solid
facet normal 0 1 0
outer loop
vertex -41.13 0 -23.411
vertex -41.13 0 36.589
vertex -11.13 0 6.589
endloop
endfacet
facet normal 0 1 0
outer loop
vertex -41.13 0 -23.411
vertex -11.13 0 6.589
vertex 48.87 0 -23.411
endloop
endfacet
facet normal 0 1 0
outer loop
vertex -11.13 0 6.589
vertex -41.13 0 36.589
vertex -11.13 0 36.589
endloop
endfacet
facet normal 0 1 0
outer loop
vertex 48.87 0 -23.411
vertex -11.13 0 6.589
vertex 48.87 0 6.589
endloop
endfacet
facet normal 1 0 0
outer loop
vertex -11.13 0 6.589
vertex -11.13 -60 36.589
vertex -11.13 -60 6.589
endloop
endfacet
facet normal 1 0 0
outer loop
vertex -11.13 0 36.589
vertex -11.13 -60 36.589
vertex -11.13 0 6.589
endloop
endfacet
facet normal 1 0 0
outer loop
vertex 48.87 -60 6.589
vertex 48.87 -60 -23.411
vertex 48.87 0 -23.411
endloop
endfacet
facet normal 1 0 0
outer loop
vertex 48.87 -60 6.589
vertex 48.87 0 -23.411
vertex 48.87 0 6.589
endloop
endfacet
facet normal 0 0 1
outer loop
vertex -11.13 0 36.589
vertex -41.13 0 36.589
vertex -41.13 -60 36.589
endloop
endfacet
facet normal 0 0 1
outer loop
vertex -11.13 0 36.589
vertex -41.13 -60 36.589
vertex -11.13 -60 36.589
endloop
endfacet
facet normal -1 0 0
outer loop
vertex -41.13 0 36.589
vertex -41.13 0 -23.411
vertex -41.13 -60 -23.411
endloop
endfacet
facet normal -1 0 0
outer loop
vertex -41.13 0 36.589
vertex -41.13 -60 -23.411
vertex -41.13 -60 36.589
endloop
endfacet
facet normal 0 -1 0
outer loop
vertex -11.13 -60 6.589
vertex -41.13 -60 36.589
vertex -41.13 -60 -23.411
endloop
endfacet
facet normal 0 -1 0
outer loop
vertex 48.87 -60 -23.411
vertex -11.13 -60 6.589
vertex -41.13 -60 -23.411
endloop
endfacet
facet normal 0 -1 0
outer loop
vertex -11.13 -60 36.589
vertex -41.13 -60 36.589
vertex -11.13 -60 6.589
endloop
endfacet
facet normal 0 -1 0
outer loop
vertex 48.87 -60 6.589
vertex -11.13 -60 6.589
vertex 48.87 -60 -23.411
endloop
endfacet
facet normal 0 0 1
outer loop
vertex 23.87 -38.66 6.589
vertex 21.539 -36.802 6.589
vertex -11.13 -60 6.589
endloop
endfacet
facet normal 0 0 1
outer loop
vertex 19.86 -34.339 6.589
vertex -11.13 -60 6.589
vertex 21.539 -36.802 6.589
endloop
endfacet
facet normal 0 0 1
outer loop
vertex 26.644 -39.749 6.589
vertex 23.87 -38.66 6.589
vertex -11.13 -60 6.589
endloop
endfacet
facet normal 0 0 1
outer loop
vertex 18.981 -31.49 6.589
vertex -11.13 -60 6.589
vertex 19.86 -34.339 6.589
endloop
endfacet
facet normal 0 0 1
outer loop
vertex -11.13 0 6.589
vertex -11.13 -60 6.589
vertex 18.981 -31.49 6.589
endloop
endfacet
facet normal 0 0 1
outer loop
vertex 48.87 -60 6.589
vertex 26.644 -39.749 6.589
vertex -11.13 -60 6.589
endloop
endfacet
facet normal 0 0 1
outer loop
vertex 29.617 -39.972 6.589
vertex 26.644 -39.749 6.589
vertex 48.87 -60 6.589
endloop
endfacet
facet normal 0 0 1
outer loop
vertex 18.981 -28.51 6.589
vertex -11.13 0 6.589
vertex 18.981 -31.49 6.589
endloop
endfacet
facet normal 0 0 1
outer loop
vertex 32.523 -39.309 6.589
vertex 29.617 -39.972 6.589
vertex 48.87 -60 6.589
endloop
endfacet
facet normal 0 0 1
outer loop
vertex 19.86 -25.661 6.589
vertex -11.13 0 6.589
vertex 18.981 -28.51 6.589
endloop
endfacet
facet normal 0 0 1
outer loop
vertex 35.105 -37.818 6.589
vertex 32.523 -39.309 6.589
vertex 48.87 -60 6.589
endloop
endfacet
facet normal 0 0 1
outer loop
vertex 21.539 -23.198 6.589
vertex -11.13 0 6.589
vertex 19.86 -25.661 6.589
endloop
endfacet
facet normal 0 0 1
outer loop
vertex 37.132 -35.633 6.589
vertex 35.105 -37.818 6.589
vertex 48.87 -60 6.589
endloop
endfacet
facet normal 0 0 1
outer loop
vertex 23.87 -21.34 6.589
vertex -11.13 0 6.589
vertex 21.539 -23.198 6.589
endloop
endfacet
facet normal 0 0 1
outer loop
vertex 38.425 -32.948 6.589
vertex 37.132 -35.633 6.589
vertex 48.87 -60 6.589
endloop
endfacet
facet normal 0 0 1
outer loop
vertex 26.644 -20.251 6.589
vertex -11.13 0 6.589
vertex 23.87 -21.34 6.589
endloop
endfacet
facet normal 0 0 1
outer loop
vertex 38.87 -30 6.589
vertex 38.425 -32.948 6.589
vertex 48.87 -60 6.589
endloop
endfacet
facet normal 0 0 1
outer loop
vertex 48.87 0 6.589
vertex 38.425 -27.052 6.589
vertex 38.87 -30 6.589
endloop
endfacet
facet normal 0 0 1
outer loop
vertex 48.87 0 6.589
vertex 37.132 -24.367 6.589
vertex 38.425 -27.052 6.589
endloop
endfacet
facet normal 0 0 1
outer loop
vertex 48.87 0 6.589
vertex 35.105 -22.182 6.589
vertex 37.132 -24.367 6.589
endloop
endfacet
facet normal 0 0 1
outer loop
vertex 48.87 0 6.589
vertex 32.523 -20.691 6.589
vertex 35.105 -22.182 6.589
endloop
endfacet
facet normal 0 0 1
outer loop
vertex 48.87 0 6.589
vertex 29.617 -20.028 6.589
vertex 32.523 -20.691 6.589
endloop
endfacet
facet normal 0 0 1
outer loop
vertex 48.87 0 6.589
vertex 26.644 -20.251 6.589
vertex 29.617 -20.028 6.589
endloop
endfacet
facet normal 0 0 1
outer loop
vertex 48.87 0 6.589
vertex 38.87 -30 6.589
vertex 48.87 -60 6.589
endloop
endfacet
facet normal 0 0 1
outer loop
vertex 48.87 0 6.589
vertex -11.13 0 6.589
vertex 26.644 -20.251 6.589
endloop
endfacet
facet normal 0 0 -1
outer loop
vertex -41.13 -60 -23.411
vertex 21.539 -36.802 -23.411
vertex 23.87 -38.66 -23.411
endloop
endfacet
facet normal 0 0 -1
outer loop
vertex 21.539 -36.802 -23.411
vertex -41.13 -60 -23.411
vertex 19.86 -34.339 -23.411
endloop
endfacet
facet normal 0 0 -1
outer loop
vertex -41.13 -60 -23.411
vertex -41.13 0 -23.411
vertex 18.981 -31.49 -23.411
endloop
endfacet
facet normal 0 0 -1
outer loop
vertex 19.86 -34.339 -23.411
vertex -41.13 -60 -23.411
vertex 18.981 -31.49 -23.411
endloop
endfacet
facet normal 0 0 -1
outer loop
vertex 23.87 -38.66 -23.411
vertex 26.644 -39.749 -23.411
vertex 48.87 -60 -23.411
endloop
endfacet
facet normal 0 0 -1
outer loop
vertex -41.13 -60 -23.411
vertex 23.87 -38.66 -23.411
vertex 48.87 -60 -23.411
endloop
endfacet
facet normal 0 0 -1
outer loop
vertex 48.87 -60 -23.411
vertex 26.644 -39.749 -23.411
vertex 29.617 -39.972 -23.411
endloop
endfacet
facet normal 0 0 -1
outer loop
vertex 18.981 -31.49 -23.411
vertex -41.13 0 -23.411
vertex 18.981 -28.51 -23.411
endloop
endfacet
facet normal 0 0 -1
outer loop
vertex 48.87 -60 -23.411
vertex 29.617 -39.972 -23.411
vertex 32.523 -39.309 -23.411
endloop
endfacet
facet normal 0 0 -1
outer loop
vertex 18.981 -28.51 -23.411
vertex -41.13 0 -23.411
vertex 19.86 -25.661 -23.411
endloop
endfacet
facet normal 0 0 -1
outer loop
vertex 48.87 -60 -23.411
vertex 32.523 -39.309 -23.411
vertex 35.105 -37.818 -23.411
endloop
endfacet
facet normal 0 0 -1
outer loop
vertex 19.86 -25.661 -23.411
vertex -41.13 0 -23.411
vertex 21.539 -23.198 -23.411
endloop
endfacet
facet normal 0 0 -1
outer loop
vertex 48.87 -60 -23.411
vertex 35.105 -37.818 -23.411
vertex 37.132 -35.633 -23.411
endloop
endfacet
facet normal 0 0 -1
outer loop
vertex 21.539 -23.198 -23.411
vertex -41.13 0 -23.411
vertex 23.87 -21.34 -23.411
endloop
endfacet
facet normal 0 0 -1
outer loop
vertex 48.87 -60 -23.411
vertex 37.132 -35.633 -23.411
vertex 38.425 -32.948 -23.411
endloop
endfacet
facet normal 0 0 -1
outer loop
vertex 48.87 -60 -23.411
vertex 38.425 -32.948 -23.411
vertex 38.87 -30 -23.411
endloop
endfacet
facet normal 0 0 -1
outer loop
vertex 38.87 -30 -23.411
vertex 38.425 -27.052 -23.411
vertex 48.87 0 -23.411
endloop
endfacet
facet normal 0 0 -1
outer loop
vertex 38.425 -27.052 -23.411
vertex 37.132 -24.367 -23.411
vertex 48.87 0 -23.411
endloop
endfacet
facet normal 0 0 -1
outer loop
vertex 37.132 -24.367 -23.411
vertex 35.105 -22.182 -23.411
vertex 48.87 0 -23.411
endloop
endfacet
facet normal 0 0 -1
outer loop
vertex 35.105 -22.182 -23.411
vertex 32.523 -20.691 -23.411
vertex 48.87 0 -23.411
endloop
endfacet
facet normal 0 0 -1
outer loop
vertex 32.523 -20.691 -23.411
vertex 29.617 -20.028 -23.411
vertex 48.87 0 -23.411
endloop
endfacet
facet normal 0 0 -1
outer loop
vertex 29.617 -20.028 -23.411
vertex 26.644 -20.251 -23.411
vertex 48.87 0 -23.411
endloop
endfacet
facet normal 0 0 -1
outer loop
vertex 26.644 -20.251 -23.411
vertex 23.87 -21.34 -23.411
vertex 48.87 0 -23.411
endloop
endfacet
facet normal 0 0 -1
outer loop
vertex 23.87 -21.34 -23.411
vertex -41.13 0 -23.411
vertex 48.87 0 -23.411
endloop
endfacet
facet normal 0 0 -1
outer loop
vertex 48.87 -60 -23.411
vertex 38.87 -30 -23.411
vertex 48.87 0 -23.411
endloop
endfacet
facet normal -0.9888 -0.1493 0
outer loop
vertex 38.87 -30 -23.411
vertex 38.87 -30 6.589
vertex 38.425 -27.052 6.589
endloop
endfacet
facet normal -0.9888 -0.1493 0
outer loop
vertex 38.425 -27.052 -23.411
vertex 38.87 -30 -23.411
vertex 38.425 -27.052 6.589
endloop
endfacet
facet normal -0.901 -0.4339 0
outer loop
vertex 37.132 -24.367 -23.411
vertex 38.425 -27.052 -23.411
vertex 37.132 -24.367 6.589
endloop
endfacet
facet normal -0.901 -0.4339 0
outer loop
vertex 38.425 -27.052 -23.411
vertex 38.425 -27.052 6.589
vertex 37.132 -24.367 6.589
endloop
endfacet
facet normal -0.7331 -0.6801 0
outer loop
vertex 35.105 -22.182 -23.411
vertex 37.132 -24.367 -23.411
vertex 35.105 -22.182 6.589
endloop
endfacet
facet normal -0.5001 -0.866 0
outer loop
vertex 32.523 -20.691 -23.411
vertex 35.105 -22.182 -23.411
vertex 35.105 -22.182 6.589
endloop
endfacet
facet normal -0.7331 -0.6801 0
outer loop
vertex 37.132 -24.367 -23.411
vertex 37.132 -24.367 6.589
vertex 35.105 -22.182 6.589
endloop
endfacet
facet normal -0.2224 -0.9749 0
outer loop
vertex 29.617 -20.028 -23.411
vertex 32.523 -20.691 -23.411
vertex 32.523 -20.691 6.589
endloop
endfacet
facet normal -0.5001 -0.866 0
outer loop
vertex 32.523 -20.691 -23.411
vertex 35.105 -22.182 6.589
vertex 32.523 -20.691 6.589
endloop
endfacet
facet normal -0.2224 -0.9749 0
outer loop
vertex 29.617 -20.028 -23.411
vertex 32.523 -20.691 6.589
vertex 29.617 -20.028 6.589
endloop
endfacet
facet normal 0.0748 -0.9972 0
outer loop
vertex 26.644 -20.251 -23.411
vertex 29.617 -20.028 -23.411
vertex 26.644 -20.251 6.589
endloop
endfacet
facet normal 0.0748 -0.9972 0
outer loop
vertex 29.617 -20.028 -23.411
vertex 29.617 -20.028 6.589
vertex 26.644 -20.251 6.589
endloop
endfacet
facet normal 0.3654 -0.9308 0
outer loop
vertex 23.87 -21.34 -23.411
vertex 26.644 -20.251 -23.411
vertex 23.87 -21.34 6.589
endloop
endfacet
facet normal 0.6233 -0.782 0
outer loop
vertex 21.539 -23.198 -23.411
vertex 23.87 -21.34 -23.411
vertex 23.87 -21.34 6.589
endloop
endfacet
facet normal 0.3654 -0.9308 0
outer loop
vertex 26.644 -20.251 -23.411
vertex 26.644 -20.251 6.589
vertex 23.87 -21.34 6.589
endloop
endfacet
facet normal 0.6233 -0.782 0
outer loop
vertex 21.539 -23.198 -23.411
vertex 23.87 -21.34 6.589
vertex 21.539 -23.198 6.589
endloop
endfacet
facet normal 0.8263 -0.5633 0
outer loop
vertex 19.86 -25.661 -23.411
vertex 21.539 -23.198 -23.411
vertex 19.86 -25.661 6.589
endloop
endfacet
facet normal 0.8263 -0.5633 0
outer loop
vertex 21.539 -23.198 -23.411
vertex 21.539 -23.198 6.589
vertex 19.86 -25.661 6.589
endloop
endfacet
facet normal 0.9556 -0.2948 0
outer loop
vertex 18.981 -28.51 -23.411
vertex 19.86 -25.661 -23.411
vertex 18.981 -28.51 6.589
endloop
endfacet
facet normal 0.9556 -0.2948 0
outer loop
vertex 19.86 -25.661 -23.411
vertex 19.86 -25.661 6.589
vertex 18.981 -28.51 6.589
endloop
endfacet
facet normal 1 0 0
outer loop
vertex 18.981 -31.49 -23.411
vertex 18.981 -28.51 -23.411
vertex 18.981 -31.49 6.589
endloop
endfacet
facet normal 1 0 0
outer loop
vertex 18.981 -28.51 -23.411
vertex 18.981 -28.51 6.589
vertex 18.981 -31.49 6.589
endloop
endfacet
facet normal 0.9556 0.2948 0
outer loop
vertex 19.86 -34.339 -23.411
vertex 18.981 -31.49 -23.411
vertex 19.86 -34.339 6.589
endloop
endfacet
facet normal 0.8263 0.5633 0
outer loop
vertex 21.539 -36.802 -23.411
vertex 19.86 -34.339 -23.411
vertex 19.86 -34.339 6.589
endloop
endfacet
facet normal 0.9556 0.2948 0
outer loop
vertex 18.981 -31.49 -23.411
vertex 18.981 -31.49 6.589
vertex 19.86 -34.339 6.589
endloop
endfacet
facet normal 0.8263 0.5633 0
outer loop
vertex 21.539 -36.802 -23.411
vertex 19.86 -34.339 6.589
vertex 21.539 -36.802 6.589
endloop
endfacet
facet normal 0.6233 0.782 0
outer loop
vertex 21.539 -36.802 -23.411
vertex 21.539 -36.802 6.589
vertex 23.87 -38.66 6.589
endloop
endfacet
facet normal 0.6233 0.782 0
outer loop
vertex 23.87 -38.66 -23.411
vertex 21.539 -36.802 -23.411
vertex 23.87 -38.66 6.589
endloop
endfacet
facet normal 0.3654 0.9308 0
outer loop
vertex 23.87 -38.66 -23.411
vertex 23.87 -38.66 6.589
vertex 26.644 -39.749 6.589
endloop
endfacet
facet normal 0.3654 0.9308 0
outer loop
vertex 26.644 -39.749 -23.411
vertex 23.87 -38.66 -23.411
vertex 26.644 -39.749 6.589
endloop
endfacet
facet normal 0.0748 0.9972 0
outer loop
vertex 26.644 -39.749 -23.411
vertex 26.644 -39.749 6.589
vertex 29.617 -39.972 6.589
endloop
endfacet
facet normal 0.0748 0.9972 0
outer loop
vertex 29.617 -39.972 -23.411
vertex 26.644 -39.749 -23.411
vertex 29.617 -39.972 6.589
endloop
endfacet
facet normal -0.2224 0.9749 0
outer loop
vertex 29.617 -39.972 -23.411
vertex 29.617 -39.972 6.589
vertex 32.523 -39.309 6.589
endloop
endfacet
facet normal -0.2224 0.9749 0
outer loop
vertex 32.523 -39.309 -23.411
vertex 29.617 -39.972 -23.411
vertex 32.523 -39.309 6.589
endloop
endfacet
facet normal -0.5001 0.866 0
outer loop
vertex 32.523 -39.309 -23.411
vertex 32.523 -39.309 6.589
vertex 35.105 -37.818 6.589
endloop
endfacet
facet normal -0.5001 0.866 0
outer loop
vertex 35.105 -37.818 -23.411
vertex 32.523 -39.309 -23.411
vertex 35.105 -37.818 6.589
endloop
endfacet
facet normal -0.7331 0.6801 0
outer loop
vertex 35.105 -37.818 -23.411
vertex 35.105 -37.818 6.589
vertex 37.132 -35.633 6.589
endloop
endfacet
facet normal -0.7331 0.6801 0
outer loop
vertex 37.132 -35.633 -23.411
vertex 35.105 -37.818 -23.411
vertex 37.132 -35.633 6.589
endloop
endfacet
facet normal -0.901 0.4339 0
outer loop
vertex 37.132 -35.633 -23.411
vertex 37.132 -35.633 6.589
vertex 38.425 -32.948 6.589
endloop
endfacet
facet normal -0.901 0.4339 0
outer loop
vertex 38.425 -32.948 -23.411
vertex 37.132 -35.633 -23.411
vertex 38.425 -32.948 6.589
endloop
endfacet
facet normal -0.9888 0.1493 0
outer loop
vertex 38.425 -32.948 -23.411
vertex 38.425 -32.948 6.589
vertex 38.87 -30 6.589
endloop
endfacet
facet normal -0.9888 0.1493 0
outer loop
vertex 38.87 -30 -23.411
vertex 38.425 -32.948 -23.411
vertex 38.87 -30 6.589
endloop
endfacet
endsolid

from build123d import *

# Parameters (mm, degrees)
F0_W     = 90
F0_H     = 60
F1_DEPTH = 60
F2_W     = 60
F2_H     = 60
F3_DEPTH = 30
F4_R     = 10
F5_DEPTH = 55.20023


with BuildPart() as f1:
    # F0 (on Front) → F1 (new body)
    with BuildSketch(Plane.XZ):
        with Locations((3.869617, 6.589345)):
            Rectangle(F0_W, F0_H)
    extrude(amount=F1_DEPTH)

    # F2 (on face) → F3 (cut)
    with BuildSketch(Plane.XY.offset(36.589345)):
        with Locations((18.869617, -30)):
            Rectangle(F2_W, F2_H)
    extrude(amount=-F3_DEPTH, mode=Mode.SUBTRACT)

    # F4 (on face) → F5 (cut)
    with BuildSketch(Plane.XY.offset(6.589345)):
        with Locations((28.869617, -30)):
            Circle(F4_R)
    extrude(amount=-F5_DEPTH, mode=Mode.SUBTRACT)


solid = f1.part
